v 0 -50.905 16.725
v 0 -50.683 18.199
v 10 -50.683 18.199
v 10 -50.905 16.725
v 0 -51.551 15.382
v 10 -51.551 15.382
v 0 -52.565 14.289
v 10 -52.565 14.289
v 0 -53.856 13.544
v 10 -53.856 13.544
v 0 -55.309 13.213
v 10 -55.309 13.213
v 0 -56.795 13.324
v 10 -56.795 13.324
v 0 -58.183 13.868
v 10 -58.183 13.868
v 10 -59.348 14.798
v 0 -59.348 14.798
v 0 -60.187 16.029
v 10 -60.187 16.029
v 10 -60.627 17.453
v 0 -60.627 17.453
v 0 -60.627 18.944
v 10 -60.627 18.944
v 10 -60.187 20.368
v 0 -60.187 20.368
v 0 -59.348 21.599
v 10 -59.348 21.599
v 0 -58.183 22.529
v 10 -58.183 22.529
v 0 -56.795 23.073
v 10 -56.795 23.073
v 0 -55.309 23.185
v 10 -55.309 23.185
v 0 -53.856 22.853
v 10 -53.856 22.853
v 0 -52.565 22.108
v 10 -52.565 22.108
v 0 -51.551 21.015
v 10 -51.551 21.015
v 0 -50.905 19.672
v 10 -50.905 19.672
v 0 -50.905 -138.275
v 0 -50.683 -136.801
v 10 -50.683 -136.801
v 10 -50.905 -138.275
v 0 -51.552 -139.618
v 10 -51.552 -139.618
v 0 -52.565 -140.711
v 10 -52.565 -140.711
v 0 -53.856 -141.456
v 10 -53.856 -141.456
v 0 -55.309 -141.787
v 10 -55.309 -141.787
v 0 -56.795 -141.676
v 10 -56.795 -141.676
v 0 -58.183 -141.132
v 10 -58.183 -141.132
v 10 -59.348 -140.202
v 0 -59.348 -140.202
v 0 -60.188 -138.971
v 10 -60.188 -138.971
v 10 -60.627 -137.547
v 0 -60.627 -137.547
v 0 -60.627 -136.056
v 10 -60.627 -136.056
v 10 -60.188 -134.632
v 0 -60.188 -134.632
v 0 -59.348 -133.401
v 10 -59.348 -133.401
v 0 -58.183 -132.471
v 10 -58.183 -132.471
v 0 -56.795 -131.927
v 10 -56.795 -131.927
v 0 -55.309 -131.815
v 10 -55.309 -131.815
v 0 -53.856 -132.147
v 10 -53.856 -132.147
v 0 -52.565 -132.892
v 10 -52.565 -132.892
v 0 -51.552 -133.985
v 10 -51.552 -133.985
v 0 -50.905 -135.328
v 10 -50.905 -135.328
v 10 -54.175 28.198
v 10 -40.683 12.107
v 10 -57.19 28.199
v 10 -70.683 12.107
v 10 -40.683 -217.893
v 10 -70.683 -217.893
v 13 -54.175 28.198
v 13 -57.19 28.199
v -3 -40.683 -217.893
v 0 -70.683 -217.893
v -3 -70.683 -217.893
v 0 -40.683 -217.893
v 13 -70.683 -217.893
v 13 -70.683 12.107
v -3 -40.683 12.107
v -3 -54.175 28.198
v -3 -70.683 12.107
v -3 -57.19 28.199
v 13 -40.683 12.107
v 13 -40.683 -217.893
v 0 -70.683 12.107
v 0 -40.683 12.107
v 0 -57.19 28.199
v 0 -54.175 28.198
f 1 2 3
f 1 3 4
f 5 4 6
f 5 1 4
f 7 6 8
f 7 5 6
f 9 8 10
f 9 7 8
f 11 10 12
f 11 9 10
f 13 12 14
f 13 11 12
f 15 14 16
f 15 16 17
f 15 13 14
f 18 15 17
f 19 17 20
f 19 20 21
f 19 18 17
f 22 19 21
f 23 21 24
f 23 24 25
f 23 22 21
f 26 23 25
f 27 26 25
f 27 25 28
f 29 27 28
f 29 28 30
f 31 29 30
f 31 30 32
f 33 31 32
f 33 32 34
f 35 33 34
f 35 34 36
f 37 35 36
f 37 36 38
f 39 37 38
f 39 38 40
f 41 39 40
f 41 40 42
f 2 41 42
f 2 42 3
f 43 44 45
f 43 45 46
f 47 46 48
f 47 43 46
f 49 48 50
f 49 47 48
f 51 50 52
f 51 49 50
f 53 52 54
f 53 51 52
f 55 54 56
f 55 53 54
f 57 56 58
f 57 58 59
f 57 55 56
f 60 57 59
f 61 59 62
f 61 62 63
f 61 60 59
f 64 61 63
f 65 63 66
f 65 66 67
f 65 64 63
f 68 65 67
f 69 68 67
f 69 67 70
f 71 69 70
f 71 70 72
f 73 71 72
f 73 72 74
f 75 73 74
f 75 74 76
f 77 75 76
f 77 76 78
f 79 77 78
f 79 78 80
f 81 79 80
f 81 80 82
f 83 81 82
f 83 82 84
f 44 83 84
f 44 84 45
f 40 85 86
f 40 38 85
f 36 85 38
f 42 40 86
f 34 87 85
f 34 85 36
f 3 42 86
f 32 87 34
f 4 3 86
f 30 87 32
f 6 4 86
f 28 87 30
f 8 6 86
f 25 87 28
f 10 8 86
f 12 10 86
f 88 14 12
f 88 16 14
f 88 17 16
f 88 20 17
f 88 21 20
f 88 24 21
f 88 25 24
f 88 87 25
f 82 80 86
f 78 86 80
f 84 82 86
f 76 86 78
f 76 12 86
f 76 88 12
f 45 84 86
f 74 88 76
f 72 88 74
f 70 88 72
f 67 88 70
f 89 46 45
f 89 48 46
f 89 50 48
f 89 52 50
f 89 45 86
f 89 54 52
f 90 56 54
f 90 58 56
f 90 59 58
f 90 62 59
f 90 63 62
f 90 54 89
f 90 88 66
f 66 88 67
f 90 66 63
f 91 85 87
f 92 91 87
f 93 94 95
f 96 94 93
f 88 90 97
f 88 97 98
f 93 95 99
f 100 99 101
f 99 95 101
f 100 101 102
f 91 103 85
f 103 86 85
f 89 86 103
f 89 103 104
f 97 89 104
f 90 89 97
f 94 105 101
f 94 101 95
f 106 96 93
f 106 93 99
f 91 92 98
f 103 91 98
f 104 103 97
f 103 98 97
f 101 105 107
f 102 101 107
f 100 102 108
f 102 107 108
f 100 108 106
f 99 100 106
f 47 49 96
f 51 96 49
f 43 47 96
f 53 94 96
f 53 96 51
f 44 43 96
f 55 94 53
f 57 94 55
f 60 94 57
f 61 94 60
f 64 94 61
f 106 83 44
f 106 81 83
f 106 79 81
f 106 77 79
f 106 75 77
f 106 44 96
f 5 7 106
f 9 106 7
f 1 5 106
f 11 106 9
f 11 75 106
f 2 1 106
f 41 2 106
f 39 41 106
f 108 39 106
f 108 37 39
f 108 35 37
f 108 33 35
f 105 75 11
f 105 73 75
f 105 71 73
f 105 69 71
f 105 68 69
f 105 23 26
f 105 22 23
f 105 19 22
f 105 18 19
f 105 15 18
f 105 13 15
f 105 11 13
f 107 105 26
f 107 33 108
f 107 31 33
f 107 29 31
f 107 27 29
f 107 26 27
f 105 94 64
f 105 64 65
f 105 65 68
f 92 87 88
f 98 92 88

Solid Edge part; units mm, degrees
sketch "Sketch1" plane through (0, 0, 0) normal (1, 0, 0) x (0, 1, 0)
  line L0 (-70.6829, -217.8929) -> (-40.6829, -217.8929)
  line L1 (-40.6829, -217.8929) -> (-40.6829, 12.1071)
  line L2 (-40.6829, 12.1071) -> (-70.6829, 12.1071)
  line L3 (-70.6829, 12.1071) -> (-70.6829, -217.8929)
  line L4 (-70.6829, 12.1071) -> (-40.6829, 12.1071)
  line L5 (-54.1753, 28.1984) -> (-40.6829, 12.1071)
  line L6 (-57.1901, 28.1988) -> (-54.1753, 28.1984)
  line L7 (-70.6829, 12.1071) -> (-57.1901, 28.1988)
  dimension "D1" = 30
  dimension "D2" = 20.9994
  dimension "D3" = 21
  dimension "D4" = 230
  dimension "D5" = 30
extrude "Protrusion1" add sketch "Sketch1" against normal blind 3
sketch "Sketch2" plane through (0, -21.8205, 20.1807) normal (1, 0, 0) x (0, 1, 0)
  circle A0 centre (-33.8622, -156.9821) radius 5
  circle A1 centre (-33.8621, -1.9821) radius 5
  dimension "D1" = 9.9998
  dimension "D2" = 155
extrude "ExtrudedProtrusion_2" add sketch "Sketch2" along normal blind 11
mirror "Mirror1" about plane through (5, -21.8205, 20.1506) normal (1, 0, 0) of "Protrusion1"
